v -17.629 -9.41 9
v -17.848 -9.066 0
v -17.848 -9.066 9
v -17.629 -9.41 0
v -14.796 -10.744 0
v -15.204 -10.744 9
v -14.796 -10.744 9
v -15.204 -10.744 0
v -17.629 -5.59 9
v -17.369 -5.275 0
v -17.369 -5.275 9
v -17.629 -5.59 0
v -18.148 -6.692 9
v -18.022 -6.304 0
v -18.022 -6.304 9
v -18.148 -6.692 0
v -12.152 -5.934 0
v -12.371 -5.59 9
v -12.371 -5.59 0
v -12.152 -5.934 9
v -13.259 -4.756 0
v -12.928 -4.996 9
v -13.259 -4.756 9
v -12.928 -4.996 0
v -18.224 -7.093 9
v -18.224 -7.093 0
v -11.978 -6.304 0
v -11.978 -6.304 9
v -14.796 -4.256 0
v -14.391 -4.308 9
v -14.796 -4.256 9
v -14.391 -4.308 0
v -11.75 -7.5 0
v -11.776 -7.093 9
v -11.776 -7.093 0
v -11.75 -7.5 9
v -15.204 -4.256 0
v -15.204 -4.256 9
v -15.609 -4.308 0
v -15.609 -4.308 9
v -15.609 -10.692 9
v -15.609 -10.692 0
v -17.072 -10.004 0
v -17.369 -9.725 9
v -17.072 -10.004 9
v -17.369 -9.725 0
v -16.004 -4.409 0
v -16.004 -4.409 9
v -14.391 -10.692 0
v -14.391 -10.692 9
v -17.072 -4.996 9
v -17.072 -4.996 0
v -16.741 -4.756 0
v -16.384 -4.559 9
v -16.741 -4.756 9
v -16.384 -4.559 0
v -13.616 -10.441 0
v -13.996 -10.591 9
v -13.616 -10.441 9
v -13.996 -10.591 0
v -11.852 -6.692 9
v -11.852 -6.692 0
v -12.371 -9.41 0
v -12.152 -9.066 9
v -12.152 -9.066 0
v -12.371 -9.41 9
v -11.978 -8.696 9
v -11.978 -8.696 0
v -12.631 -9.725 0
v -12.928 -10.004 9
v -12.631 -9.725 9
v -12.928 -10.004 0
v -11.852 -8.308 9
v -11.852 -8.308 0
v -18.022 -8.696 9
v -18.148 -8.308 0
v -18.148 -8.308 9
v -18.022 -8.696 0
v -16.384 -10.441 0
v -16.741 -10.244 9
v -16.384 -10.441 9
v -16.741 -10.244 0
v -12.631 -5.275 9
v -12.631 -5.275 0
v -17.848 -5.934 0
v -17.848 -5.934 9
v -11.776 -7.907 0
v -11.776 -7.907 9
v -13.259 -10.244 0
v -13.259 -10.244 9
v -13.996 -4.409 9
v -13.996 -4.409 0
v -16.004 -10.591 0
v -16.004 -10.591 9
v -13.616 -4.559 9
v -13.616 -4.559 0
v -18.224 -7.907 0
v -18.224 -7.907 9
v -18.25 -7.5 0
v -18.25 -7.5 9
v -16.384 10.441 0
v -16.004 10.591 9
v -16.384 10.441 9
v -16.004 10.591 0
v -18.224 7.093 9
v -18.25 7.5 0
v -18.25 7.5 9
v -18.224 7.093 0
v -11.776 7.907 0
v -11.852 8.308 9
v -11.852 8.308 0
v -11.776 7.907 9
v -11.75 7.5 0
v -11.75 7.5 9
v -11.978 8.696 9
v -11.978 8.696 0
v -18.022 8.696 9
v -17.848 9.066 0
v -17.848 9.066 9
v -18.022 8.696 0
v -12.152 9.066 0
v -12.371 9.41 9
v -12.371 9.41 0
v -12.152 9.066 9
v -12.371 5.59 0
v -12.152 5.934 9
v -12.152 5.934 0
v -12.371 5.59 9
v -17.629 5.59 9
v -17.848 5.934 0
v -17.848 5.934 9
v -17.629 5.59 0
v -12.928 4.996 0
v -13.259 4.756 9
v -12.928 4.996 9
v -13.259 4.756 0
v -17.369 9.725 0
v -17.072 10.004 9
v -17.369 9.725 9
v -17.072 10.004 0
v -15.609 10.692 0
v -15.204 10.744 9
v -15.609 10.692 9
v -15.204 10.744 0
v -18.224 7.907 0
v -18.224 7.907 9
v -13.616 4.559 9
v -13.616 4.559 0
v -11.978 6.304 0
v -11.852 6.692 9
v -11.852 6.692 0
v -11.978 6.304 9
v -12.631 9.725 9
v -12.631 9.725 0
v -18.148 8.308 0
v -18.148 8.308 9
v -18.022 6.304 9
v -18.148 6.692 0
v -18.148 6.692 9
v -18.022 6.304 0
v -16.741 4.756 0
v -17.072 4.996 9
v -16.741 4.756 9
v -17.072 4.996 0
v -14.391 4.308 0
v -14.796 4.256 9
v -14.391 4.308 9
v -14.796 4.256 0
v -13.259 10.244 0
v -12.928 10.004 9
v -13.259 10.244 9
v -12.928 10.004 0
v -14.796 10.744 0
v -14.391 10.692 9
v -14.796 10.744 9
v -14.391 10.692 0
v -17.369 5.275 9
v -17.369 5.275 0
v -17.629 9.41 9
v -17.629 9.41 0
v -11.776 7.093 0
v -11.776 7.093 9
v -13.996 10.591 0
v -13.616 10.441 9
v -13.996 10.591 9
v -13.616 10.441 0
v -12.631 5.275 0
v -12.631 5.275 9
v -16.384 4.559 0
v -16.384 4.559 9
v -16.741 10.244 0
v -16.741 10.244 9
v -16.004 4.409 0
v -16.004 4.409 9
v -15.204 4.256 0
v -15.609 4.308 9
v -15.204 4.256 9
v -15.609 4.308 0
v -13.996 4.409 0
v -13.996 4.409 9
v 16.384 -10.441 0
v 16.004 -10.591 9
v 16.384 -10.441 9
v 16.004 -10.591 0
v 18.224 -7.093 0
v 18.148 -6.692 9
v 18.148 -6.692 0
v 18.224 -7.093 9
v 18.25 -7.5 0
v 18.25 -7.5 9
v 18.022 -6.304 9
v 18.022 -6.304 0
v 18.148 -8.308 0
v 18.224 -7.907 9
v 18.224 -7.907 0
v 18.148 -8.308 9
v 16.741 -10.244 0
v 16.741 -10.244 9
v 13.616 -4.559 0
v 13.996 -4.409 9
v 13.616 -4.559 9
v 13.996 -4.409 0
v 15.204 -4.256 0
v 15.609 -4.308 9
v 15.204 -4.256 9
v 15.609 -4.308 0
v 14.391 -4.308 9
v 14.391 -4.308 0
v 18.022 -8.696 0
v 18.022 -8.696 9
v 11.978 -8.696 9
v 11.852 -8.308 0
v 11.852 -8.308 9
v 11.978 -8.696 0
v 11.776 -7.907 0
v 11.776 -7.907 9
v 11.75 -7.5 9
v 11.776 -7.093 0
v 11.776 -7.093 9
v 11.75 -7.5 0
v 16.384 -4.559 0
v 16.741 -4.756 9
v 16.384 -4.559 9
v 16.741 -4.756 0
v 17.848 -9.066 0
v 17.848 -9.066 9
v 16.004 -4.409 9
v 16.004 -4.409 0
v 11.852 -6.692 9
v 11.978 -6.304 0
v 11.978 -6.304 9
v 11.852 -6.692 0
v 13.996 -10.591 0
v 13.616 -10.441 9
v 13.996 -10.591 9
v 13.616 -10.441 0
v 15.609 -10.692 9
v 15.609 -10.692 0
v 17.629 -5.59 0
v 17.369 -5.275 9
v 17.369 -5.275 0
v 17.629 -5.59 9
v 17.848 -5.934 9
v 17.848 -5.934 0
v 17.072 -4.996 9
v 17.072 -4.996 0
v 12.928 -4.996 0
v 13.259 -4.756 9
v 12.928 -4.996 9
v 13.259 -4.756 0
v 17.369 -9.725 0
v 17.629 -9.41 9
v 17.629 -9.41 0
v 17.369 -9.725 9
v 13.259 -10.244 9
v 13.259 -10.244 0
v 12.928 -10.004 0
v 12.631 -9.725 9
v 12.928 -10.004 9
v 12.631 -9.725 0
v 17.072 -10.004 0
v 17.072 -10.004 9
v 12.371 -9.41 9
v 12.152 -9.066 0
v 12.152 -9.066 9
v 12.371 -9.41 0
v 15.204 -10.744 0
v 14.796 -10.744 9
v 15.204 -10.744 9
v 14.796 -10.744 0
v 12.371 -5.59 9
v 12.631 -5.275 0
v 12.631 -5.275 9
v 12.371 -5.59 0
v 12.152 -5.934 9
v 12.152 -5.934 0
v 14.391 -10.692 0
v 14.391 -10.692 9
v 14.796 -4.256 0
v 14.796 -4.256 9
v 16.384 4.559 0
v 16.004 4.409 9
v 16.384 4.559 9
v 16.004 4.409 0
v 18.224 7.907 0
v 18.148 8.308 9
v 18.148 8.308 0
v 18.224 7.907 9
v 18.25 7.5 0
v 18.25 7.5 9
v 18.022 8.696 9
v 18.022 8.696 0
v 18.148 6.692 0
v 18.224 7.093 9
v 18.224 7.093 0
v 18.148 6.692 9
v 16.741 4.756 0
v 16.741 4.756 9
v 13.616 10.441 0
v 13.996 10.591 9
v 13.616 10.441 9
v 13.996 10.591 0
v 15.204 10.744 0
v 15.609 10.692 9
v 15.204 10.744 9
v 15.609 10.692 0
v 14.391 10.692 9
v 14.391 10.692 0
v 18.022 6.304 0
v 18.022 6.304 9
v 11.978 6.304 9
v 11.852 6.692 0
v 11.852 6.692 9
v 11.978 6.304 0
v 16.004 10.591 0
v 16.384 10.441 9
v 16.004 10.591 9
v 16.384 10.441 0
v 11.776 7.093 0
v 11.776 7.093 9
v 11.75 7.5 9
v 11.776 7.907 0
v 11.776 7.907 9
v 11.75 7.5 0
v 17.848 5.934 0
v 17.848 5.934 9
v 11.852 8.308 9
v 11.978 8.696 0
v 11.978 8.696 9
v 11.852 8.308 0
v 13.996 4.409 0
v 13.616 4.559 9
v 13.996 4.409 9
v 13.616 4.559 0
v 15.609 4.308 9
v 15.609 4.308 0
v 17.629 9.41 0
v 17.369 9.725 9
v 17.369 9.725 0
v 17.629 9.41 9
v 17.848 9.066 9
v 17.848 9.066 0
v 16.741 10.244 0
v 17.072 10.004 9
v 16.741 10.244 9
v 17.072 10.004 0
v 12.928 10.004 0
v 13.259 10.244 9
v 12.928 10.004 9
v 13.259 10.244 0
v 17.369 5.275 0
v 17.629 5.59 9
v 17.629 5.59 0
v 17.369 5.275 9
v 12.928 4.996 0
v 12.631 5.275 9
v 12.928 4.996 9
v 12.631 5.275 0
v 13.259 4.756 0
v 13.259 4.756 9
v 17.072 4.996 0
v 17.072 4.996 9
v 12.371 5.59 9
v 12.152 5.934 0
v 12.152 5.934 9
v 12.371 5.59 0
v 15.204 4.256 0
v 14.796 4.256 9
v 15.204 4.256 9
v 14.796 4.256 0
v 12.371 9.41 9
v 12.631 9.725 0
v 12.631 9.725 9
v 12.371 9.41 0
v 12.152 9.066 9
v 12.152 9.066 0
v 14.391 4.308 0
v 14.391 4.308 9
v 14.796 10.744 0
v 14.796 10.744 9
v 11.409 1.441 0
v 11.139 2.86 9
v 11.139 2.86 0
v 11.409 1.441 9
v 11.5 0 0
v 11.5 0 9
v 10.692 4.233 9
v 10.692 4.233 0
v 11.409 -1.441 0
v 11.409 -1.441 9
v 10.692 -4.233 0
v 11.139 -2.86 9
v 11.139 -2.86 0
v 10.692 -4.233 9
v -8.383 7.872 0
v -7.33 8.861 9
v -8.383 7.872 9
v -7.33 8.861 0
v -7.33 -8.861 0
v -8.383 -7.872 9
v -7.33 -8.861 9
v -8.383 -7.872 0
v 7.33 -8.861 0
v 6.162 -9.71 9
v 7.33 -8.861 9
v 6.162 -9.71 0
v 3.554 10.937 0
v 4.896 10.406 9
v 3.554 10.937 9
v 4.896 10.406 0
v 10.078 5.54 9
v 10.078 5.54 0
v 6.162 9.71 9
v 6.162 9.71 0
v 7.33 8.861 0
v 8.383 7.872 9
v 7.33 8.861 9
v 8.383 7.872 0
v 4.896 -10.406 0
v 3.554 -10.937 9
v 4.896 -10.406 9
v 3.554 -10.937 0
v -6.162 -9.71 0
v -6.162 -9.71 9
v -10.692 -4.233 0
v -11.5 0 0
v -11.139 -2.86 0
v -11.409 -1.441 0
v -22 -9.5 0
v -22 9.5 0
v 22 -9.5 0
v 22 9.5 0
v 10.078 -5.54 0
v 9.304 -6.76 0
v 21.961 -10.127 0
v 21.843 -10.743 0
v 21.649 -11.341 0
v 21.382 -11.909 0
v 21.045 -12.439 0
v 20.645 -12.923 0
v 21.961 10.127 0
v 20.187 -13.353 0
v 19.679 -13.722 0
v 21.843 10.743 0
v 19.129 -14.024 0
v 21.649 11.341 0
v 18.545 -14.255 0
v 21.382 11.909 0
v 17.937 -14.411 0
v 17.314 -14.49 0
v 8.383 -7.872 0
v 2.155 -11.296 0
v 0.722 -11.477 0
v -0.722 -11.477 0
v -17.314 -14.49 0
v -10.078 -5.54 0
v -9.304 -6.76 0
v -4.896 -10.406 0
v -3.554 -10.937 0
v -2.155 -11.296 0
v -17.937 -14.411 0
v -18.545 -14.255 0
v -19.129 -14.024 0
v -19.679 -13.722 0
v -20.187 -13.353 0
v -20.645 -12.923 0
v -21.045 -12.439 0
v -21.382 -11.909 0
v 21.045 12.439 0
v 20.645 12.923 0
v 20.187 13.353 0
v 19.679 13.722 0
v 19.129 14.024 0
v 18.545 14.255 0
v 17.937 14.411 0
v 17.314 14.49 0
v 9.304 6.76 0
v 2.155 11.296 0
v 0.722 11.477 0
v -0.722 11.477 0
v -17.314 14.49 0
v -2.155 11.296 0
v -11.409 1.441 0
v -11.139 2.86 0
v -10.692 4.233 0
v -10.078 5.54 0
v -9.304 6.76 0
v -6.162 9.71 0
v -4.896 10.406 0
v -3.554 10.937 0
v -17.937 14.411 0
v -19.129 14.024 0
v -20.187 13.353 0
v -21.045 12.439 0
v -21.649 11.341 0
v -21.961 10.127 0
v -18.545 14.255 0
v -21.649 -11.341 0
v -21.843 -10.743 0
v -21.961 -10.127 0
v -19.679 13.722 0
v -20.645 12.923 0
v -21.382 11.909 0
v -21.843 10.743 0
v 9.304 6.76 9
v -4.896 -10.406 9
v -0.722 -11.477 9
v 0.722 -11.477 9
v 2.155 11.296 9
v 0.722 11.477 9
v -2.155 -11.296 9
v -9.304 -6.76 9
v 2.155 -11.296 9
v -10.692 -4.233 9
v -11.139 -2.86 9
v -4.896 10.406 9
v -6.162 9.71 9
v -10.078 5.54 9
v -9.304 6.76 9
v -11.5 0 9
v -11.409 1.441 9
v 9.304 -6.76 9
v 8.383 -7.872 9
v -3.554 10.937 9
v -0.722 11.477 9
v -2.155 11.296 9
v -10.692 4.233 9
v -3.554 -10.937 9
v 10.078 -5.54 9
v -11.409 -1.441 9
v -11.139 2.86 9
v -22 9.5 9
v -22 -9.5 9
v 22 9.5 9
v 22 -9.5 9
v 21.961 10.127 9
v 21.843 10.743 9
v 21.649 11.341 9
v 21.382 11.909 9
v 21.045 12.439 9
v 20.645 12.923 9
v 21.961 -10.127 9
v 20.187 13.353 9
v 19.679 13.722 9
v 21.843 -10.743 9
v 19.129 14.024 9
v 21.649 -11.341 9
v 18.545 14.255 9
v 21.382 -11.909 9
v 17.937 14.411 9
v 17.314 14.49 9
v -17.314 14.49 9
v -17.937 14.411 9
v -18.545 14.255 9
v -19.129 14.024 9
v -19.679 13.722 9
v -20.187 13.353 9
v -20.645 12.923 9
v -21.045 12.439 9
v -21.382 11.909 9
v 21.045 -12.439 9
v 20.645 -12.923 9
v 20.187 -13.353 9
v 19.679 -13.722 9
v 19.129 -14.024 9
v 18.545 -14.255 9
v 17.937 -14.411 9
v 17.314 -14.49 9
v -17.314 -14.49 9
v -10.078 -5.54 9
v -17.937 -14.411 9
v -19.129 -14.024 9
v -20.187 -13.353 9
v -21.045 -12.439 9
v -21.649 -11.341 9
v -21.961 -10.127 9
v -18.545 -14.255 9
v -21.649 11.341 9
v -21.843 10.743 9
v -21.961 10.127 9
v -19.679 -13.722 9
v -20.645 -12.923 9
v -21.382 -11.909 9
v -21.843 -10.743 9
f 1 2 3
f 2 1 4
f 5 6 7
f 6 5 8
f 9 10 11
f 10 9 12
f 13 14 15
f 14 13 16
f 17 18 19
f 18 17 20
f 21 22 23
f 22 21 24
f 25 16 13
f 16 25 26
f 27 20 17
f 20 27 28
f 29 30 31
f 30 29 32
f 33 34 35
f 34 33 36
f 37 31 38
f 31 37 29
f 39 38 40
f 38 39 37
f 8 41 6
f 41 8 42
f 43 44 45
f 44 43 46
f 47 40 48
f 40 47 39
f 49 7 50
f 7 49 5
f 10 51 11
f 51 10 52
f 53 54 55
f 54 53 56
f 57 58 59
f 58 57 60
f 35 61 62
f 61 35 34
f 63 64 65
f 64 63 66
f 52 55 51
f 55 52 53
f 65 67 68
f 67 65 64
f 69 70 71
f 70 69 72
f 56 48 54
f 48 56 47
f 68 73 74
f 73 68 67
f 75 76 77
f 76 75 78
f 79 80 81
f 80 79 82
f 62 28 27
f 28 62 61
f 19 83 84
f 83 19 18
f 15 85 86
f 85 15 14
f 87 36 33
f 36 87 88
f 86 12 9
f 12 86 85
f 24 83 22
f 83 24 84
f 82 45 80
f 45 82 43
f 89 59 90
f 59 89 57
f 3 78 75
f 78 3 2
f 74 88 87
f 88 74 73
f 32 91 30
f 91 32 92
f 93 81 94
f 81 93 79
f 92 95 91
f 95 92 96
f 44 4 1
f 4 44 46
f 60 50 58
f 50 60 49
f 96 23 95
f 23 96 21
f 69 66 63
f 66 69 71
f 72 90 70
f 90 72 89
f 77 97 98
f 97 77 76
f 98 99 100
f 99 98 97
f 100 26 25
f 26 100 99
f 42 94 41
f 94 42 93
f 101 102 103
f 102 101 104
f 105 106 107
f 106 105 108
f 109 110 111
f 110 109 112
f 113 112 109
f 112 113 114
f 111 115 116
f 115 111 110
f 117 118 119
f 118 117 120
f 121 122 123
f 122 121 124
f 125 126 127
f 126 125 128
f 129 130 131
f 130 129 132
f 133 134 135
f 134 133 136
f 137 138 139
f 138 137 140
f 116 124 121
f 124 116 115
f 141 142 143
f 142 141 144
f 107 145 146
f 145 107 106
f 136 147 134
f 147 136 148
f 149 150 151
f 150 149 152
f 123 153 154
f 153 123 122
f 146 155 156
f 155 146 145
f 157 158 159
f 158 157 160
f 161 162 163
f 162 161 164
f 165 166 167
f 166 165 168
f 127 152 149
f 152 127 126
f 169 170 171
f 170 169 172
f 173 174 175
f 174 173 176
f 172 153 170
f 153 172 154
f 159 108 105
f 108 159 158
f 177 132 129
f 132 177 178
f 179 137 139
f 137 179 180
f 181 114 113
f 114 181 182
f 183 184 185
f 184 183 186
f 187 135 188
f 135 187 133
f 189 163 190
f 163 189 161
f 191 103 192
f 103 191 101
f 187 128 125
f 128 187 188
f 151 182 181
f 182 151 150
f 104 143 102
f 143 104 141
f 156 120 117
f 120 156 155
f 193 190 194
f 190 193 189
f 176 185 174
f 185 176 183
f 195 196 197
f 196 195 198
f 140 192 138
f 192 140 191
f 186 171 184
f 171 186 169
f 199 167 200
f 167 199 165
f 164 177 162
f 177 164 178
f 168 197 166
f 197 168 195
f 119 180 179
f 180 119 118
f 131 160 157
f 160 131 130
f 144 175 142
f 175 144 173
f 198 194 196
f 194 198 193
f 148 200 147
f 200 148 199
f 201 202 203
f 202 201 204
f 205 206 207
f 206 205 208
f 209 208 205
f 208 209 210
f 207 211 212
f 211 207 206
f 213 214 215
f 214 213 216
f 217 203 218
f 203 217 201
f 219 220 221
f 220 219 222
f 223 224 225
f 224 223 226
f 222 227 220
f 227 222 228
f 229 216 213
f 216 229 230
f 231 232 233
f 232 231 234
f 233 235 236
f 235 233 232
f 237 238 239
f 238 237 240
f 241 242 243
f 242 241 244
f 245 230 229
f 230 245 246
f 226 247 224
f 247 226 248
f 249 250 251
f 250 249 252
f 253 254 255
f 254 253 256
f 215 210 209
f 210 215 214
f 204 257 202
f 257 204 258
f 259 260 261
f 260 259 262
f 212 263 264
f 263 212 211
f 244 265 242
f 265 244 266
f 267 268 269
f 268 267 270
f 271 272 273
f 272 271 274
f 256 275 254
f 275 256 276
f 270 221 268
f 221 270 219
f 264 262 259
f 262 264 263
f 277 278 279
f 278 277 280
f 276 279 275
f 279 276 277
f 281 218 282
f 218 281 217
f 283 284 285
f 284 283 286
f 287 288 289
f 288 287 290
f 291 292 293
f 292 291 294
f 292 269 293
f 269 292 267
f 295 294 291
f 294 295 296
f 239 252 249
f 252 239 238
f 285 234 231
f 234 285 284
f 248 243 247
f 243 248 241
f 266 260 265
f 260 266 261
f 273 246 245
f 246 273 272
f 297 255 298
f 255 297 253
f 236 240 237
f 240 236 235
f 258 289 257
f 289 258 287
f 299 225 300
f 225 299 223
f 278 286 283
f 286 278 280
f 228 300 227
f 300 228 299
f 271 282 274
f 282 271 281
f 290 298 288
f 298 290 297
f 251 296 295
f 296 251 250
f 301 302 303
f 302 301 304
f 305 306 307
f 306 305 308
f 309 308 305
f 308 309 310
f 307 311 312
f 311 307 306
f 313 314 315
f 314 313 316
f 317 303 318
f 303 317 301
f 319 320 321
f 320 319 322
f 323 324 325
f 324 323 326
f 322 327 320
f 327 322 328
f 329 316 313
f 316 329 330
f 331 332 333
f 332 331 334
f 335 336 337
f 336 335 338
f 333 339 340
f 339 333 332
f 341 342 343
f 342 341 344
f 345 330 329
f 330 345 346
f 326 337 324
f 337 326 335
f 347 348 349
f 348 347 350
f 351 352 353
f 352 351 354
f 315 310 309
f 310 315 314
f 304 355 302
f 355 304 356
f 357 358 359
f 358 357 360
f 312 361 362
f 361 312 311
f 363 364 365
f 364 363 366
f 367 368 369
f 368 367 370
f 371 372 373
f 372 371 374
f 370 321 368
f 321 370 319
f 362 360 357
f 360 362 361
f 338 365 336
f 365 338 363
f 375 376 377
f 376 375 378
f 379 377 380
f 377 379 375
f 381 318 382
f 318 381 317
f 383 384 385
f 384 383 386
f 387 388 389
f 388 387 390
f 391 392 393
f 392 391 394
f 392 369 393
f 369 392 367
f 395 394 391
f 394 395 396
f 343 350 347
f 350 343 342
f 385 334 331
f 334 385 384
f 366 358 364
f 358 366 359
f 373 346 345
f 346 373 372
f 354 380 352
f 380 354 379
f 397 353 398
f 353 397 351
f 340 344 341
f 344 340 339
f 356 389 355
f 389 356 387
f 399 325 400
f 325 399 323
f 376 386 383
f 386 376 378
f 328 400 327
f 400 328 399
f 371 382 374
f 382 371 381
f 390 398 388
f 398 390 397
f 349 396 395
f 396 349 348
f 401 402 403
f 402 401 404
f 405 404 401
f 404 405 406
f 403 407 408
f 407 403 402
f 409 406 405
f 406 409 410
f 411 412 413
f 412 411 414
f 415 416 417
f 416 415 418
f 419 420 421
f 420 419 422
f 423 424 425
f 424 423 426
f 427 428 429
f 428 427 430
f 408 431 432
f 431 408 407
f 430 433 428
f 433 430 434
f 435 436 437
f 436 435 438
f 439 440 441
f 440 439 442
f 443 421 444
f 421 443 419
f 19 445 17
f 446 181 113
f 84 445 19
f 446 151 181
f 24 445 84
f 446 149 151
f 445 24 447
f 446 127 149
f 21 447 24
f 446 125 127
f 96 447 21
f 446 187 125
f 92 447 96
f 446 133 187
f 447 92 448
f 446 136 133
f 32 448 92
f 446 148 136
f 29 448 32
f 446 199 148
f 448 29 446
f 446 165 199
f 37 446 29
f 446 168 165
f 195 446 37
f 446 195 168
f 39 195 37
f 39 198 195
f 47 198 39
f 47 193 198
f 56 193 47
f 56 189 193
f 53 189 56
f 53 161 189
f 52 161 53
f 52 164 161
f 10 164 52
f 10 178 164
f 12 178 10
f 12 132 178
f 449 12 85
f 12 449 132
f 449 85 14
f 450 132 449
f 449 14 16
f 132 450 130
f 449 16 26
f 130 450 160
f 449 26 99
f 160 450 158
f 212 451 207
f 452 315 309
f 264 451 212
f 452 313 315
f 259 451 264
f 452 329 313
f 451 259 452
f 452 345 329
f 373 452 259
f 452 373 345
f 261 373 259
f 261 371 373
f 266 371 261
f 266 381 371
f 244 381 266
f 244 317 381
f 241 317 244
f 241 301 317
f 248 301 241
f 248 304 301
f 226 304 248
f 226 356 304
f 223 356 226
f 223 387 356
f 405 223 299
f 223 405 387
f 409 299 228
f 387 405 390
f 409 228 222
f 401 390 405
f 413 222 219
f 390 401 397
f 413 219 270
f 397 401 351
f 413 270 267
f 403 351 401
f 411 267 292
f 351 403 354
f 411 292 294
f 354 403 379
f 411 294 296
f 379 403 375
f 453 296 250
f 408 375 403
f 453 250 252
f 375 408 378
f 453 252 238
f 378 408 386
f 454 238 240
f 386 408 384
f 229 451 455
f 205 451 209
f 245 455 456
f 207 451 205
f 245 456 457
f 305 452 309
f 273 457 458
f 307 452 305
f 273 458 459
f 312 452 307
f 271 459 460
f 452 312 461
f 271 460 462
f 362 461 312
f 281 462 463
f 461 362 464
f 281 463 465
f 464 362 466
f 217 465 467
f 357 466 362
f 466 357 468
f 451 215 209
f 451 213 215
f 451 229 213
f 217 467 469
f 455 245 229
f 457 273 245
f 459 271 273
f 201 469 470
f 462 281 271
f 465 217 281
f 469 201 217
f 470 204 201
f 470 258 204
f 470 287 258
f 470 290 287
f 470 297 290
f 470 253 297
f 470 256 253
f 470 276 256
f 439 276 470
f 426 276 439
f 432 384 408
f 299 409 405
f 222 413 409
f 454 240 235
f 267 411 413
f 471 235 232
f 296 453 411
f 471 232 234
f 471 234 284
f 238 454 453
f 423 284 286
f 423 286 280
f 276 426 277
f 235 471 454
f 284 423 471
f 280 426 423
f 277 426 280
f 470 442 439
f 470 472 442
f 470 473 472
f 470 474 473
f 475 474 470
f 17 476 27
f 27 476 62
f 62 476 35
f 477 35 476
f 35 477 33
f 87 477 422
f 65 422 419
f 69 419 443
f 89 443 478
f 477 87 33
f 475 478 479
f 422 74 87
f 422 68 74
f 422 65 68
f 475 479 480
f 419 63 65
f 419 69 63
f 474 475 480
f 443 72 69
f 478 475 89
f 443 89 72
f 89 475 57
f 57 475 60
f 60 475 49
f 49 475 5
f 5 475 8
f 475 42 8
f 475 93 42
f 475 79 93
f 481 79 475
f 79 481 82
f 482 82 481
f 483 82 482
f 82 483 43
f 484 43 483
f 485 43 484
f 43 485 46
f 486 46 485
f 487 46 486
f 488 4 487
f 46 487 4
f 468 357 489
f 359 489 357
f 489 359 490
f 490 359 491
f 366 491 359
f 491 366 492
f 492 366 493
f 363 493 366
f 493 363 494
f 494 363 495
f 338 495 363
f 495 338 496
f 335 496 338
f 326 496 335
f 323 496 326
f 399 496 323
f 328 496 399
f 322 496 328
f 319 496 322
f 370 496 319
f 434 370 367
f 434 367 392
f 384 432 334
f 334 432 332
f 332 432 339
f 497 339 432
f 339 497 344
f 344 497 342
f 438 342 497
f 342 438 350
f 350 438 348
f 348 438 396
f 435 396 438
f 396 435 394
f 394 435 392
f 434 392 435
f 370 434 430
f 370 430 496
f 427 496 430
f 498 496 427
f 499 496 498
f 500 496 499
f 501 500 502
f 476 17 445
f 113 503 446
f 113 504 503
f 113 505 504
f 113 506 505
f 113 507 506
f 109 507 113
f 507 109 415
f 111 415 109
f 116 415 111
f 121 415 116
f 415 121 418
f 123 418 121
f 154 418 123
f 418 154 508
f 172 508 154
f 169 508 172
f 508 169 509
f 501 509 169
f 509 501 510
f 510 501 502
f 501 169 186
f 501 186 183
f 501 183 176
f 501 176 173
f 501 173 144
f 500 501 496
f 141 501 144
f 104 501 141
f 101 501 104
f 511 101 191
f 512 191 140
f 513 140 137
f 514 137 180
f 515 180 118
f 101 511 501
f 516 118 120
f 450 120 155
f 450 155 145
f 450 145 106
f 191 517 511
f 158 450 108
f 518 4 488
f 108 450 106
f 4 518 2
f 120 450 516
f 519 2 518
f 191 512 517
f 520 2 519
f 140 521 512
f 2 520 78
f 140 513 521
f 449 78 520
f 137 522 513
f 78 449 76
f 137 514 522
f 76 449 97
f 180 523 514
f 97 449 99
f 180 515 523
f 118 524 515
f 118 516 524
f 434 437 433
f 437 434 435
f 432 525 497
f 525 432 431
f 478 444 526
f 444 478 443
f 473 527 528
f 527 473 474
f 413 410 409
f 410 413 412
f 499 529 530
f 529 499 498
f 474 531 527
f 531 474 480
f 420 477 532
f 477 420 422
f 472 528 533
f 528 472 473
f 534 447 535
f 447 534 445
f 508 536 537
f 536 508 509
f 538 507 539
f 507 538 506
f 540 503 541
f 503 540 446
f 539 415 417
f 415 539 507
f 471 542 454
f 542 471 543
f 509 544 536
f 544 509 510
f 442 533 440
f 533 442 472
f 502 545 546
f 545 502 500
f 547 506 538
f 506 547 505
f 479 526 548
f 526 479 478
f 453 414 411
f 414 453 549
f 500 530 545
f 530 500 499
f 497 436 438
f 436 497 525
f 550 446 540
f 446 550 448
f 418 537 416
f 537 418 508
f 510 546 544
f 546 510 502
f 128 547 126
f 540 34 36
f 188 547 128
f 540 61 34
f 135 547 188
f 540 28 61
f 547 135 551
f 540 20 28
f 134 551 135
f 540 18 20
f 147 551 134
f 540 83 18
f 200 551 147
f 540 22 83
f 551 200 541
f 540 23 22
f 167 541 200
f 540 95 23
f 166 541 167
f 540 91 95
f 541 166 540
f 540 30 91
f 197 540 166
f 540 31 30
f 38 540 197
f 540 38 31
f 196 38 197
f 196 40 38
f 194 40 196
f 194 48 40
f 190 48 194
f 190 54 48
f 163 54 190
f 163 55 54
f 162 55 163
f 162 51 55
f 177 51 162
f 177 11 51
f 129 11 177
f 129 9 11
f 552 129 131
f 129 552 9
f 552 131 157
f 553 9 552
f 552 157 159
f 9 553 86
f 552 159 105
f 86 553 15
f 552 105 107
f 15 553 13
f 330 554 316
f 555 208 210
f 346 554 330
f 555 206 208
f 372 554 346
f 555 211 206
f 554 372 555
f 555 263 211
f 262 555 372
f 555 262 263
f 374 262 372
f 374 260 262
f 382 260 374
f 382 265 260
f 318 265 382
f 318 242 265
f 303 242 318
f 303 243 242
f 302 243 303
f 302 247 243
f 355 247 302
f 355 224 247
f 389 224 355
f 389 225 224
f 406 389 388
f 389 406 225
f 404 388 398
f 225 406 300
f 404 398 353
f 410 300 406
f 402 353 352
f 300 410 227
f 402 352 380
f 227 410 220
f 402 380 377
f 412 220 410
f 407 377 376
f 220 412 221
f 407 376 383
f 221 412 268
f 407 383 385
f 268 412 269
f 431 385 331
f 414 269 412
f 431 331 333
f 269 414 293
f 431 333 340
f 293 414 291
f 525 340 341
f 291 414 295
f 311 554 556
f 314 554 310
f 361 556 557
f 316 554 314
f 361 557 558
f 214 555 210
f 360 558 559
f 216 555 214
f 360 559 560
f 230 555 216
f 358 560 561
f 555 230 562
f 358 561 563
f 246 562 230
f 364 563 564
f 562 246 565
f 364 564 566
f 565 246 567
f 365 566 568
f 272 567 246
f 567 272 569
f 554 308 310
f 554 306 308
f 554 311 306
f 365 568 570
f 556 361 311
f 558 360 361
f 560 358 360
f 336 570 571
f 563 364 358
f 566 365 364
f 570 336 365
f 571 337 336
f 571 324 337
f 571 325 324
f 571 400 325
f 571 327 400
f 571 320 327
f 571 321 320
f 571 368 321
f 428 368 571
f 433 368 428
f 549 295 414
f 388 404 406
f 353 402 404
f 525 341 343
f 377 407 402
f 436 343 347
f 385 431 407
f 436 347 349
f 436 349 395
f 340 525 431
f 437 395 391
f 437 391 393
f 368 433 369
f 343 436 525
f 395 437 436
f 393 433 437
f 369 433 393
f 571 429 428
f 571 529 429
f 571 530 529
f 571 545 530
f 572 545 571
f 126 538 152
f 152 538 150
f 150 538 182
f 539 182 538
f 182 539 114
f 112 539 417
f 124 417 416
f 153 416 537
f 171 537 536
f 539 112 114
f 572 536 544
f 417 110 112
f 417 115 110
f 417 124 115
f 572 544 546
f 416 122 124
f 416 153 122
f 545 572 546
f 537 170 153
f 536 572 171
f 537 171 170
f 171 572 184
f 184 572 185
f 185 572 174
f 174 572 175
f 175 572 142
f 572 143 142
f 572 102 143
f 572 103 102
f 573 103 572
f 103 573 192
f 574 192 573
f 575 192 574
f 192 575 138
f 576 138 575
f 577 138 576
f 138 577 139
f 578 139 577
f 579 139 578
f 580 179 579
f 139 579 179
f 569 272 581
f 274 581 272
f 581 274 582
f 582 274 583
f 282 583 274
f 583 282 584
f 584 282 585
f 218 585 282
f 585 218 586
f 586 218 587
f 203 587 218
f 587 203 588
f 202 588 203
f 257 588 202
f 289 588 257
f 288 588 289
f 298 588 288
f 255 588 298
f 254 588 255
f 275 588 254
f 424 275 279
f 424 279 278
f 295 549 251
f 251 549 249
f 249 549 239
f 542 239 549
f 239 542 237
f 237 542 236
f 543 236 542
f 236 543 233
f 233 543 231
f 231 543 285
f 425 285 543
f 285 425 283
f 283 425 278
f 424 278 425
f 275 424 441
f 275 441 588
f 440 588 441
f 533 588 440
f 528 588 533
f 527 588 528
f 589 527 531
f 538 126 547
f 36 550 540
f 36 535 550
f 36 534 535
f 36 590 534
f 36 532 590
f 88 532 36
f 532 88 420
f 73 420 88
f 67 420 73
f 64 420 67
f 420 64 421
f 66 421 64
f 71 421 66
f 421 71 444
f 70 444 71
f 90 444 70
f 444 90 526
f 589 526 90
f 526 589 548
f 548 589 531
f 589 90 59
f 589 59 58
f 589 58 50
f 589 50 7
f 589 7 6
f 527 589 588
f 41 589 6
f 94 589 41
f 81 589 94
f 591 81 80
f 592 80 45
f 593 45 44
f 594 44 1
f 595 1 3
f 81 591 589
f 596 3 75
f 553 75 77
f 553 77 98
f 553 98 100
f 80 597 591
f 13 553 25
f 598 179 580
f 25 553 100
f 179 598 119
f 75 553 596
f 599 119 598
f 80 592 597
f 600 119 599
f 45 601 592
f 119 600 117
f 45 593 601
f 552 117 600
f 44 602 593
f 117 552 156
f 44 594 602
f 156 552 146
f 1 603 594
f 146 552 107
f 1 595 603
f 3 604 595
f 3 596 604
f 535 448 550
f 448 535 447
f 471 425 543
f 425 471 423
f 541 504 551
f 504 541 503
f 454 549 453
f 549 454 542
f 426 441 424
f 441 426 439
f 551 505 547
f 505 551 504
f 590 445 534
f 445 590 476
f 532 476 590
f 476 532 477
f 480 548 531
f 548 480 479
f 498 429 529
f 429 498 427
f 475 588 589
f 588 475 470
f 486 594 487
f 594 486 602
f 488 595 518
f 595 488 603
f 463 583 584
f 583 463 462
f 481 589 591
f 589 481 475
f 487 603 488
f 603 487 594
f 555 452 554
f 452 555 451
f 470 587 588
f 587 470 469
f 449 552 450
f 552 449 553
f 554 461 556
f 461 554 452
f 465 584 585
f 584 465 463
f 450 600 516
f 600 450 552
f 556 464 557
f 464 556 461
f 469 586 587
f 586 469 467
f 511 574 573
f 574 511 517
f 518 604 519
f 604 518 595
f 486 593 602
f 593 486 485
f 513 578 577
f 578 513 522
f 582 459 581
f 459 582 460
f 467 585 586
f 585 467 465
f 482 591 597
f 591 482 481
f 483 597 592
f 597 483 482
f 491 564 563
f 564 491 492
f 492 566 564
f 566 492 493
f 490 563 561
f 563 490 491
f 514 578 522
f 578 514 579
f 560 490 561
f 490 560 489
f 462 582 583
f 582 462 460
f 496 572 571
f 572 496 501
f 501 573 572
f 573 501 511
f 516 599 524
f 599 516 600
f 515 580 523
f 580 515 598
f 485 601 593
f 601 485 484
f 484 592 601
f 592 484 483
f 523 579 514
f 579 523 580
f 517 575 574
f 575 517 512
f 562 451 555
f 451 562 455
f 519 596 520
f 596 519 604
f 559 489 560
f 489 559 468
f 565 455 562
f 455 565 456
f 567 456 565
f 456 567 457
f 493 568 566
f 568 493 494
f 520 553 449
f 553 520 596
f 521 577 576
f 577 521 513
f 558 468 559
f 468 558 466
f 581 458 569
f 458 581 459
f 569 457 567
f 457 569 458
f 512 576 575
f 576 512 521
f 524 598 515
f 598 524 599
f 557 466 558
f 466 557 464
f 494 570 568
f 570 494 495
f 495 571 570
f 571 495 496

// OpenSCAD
$fn = 50;


difference() {
	union() {
		hull() {
			translate(v = [-17.0000000000, 9.5000000000, 0]) {
				cylinder(h = 9, r = 5);
			}
			translate(v = [17.0000000000, 9.5000000000, 0]) {
				cylinder(h = 9, r = 5);
			}
			translate(v = [-17.0000000000, -9.5000000000, 0]) {
				cylinder(h = 9, r = 5);
			}
			translate(v = [17.0000000000, -9.5000000000, 0]) {
				cylinder(h = 9, r = 5);
			}
		}
	}
	union() {
		#translate(v = [-15.0000000000, -7.5000000000, -100.0000000000]) {
			cylinder(h = 200, r = 3.2500000000);
		}
		#translate(v = [-15.0000000000, 7.5000000000, -100.0000000000]) {
			cylinder(h = 200, r = 3.2500000000);
		}
		#translate(v = [15.0000000000, -7.5000000000, -100.0000000000]) {
			cylinder(h = 200, r = 3.2500000000);
		}
		#translate(v = [15.0000000000, 7.5000000000, -100.0000000000]) {
			cylinder(h = 200, r = 3.2500000000);
		}
		#cylinder(h = 9, r = 11.5000000000);
	}
}
